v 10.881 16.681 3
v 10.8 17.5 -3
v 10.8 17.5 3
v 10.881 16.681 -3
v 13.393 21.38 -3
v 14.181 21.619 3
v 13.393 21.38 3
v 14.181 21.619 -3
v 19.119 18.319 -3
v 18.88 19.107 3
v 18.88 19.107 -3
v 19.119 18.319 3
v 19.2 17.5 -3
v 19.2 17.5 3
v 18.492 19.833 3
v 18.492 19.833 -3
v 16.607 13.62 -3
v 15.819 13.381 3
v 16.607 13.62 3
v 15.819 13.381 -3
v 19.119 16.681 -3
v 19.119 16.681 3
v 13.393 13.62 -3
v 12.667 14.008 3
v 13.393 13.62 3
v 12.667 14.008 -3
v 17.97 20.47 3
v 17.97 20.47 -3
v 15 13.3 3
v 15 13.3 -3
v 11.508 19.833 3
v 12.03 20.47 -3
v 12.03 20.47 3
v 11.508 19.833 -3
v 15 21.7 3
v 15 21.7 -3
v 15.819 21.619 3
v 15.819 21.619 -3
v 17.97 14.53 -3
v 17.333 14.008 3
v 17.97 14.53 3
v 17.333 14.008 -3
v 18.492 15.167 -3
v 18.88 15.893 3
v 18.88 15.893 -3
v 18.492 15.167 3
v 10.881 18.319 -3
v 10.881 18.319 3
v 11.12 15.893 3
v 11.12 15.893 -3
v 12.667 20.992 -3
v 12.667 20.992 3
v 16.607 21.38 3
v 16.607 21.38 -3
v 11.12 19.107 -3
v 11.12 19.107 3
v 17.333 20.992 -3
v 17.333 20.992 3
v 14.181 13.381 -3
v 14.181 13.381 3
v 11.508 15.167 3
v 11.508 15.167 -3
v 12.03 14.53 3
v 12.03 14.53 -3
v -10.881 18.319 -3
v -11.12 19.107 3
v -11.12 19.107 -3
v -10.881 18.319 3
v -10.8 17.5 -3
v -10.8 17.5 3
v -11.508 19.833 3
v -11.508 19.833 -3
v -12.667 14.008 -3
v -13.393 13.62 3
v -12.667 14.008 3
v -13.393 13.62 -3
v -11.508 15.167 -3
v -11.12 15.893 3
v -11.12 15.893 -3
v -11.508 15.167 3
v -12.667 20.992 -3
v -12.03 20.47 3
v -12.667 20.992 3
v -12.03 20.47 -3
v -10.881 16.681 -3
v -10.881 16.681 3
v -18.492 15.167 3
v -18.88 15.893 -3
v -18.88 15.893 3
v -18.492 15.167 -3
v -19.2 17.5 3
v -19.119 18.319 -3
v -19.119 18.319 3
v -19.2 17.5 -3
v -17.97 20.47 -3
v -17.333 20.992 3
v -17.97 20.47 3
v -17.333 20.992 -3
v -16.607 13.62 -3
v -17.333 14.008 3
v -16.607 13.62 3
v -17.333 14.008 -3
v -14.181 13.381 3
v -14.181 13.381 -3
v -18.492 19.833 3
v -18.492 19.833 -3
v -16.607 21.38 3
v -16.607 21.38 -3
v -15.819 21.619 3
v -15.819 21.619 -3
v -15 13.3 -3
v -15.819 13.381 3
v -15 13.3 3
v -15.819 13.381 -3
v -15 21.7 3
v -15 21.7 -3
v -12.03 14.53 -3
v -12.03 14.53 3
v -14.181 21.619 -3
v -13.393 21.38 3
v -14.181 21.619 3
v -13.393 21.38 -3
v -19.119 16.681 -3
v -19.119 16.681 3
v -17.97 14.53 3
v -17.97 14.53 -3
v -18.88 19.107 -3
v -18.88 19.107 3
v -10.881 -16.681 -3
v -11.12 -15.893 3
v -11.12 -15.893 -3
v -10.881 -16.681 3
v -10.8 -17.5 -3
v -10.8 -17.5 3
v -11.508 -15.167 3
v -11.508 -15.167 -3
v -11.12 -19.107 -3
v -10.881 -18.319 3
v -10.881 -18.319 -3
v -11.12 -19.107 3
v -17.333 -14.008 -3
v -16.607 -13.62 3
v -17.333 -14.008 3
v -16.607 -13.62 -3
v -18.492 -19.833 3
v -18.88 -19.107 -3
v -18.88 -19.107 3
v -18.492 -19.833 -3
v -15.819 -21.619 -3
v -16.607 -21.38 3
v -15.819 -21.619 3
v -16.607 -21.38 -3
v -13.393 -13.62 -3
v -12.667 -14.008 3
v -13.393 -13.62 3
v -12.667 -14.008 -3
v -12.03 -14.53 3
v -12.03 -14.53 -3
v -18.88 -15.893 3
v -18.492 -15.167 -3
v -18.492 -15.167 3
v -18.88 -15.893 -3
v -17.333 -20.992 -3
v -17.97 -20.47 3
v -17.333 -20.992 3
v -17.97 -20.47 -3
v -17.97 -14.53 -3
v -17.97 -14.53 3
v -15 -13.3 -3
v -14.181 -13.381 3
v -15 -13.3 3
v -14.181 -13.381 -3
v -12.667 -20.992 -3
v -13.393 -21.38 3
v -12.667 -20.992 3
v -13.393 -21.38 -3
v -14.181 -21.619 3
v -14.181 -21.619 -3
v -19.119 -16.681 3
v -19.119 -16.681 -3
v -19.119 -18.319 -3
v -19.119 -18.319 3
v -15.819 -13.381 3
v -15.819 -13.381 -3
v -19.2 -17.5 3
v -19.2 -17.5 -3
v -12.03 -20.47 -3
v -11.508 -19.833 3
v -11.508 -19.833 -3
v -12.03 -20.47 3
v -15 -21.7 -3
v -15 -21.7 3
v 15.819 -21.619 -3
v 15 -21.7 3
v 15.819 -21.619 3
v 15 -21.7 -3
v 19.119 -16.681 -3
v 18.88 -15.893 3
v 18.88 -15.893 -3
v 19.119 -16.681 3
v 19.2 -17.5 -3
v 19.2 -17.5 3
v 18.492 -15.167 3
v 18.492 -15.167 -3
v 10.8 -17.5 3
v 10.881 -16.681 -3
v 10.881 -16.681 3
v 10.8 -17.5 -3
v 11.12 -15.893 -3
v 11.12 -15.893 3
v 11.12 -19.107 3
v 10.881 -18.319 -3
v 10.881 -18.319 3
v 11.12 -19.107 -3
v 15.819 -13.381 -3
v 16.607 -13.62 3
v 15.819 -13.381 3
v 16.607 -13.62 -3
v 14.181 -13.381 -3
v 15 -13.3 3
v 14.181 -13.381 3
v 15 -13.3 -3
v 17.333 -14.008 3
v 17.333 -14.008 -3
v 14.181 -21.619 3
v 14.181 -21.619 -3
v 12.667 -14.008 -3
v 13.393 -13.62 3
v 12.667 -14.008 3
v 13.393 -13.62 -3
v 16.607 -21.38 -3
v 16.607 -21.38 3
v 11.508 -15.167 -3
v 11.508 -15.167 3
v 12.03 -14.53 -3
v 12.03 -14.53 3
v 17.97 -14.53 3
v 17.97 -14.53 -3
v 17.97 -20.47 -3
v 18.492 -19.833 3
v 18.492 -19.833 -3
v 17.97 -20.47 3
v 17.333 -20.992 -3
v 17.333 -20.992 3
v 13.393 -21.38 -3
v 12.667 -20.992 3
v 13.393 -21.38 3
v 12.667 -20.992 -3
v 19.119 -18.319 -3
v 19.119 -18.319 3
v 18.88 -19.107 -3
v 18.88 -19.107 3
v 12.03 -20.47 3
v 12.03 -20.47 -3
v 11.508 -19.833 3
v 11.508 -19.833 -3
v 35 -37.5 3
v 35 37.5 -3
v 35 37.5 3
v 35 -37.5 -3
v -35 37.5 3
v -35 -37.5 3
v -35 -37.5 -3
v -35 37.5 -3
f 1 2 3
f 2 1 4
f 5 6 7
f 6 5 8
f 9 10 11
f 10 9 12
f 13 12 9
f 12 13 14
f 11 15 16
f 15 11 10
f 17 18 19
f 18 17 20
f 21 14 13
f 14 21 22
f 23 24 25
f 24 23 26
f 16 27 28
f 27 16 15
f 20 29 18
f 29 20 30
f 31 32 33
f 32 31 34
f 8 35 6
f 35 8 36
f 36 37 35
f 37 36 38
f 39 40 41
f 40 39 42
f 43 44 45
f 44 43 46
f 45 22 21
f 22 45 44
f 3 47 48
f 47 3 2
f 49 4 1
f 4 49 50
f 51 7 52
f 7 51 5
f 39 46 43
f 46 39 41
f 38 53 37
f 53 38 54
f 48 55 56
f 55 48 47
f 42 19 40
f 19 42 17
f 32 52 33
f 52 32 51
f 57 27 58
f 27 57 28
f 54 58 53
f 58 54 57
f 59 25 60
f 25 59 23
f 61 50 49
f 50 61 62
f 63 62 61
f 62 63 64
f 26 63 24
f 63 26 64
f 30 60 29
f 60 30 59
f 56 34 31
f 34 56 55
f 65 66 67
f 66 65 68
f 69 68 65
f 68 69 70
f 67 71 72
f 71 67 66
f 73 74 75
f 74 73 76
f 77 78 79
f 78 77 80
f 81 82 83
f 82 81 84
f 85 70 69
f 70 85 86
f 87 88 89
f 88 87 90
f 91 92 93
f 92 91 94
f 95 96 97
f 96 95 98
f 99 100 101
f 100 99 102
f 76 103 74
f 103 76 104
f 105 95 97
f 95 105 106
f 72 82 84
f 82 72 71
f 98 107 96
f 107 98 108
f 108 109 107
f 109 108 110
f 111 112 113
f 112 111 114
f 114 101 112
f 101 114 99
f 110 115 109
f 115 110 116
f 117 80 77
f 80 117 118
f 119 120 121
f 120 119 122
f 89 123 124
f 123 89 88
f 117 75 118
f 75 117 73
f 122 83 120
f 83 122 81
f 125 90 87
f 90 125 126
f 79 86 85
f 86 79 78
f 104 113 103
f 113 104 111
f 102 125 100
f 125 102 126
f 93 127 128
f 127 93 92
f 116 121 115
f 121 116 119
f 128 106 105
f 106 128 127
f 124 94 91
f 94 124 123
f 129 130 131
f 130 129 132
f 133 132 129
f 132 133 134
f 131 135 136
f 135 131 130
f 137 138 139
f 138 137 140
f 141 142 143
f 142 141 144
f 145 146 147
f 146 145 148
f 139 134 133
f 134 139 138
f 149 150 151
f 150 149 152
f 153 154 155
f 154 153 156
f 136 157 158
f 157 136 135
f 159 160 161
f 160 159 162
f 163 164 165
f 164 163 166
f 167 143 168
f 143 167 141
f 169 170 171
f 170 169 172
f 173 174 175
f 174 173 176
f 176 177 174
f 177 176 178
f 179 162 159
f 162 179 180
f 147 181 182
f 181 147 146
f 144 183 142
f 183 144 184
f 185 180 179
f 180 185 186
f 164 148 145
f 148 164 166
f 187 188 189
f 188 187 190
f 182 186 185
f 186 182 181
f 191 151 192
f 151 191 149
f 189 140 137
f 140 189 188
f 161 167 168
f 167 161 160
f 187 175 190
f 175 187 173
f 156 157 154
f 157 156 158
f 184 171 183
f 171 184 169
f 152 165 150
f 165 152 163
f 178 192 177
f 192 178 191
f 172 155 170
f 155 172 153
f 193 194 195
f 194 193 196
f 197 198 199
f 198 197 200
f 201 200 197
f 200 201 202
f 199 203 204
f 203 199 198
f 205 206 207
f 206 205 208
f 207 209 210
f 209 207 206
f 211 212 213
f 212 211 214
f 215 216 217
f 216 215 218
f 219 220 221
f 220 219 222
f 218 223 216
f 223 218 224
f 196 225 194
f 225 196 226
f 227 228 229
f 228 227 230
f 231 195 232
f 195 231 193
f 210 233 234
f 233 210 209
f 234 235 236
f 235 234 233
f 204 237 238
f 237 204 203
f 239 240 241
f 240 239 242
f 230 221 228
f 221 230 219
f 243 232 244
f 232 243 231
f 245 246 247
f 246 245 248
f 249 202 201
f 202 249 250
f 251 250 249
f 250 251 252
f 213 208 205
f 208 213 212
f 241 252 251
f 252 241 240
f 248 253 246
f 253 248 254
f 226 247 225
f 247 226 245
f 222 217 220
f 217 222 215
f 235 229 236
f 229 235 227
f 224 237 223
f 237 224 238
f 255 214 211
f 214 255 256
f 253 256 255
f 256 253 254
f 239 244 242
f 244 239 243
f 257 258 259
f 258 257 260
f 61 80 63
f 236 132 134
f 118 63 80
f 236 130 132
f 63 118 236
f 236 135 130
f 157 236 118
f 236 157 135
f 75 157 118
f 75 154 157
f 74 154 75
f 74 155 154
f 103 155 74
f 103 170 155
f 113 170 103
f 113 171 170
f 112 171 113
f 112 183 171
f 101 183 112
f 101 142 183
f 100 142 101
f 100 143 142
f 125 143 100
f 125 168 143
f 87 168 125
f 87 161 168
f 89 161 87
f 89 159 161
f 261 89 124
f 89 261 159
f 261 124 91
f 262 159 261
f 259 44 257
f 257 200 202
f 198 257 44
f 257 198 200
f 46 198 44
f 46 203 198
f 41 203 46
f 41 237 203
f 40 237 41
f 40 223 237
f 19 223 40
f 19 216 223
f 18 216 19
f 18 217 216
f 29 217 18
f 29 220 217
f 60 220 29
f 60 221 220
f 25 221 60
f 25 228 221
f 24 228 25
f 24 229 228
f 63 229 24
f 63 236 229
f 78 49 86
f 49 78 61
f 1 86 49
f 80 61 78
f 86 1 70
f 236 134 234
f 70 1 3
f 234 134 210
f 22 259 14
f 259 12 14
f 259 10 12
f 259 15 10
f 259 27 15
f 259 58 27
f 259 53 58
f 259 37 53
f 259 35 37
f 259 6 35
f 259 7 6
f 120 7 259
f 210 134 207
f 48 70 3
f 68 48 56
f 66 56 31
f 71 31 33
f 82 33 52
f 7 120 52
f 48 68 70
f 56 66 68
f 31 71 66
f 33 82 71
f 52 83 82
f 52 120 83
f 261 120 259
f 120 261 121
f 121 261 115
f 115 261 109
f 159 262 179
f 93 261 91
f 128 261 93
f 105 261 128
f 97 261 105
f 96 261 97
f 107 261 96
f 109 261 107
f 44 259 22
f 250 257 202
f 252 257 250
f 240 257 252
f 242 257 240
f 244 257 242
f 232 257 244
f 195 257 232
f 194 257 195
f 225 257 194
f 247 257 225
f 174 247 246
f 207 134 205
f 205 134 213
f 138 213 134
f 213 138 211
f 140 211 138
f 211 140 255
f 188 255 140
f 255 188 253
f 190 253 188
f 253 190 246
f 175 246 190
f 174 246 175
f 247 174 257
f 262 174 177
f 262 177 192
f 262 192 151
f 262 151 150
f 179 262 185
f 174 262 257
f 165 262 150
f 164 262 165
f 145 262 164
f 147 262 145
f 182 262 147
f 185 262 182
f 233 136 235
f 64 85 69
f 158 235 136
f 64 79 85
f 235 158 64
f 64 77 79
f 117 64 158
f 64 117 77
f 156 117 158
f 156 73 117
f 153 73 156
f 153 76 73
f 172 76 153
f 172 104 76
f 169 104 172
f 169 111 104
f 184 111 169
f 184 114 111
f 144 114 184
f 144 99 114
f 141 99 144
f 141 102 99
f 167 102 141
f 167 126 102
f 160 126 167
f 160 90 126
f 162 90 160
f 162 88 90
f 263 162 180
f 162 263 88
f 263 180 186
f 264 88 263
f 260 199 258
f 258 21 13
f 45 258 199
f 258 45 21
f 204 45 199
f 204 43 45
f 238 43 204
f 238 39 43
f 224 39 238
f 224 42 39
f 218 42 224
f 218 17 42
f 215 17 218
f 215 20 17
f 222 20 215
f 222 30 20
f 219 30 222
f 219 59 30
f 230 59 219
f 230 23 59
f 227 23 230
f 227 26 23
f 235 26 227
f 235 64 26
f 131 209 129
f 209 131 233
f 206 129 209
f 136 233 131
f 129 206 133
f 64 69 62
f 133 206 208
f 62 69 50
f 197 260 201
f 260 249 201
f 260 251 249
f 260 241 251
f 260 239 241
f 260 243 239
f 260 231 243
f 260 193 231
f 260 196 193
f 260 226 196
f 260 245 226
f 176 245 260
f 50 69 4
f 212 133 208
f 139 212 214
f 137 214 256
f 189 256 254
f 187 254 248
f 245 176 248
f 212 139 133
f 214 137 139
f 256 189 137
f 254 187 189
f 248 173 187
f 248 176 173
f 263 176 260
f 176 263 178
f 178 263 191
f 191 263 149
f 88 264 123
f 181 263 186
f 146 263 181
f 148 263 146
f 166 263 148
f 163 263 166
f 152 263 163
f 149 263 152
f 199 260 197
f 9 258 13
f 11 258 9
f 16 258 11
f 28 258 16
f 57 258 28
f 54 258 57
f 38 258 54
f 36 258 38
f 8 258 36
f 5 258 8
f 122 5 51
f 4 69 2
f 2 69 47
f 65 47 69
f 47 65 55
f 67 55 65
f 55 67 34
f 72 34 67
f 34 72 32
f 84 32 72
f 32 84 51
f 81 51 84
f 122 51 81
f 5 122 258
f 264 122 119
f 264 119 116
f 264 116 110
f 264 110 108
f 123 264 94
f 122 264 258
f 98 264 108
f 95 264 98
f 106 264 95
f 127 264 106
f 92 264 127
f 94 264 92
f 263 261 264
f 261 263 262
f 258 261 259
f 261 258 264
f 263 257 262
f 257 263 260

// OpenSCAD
$fn = 32;

// ----------------------------------------------------------------------
// Corner plate 70 x 75 x 6
// 4 holes, centres taken from the edge offset
// ----------------------------------------------------------------------

// --- parameters (mm) ---
plate = [70, 75, 6];  // overall size (x, y, z)
holes = 4;            // number of holes the drawing asks for
hole_d = 8.4;         // hole diameter
edge = 20;            // hole centre offset from the plate edge

// --- derived feature positions (mm) ---
corner_x = plate[0] / 2 - edge;  // = 15   corner hole X
corner_y = plate[1] / 2 - edge;  // = 17.5   corner hole Y
feature_centers = [
  [corner_x, corner_y],
  [-corner_x, corner_y],
  [-corner_x, -corner_y],
  [corner_x, -corner_y]
];   // hole centres the loop below drills

// plate outline, every hole drilled through with the same cutters
difference() {
  cube(plate, center = true);
  for (centre = feature_centers)
    translate([centre[0], centre[1], 0])
      cylinder(d = hole_d, h = plate[2] + 2, center = true);
}
